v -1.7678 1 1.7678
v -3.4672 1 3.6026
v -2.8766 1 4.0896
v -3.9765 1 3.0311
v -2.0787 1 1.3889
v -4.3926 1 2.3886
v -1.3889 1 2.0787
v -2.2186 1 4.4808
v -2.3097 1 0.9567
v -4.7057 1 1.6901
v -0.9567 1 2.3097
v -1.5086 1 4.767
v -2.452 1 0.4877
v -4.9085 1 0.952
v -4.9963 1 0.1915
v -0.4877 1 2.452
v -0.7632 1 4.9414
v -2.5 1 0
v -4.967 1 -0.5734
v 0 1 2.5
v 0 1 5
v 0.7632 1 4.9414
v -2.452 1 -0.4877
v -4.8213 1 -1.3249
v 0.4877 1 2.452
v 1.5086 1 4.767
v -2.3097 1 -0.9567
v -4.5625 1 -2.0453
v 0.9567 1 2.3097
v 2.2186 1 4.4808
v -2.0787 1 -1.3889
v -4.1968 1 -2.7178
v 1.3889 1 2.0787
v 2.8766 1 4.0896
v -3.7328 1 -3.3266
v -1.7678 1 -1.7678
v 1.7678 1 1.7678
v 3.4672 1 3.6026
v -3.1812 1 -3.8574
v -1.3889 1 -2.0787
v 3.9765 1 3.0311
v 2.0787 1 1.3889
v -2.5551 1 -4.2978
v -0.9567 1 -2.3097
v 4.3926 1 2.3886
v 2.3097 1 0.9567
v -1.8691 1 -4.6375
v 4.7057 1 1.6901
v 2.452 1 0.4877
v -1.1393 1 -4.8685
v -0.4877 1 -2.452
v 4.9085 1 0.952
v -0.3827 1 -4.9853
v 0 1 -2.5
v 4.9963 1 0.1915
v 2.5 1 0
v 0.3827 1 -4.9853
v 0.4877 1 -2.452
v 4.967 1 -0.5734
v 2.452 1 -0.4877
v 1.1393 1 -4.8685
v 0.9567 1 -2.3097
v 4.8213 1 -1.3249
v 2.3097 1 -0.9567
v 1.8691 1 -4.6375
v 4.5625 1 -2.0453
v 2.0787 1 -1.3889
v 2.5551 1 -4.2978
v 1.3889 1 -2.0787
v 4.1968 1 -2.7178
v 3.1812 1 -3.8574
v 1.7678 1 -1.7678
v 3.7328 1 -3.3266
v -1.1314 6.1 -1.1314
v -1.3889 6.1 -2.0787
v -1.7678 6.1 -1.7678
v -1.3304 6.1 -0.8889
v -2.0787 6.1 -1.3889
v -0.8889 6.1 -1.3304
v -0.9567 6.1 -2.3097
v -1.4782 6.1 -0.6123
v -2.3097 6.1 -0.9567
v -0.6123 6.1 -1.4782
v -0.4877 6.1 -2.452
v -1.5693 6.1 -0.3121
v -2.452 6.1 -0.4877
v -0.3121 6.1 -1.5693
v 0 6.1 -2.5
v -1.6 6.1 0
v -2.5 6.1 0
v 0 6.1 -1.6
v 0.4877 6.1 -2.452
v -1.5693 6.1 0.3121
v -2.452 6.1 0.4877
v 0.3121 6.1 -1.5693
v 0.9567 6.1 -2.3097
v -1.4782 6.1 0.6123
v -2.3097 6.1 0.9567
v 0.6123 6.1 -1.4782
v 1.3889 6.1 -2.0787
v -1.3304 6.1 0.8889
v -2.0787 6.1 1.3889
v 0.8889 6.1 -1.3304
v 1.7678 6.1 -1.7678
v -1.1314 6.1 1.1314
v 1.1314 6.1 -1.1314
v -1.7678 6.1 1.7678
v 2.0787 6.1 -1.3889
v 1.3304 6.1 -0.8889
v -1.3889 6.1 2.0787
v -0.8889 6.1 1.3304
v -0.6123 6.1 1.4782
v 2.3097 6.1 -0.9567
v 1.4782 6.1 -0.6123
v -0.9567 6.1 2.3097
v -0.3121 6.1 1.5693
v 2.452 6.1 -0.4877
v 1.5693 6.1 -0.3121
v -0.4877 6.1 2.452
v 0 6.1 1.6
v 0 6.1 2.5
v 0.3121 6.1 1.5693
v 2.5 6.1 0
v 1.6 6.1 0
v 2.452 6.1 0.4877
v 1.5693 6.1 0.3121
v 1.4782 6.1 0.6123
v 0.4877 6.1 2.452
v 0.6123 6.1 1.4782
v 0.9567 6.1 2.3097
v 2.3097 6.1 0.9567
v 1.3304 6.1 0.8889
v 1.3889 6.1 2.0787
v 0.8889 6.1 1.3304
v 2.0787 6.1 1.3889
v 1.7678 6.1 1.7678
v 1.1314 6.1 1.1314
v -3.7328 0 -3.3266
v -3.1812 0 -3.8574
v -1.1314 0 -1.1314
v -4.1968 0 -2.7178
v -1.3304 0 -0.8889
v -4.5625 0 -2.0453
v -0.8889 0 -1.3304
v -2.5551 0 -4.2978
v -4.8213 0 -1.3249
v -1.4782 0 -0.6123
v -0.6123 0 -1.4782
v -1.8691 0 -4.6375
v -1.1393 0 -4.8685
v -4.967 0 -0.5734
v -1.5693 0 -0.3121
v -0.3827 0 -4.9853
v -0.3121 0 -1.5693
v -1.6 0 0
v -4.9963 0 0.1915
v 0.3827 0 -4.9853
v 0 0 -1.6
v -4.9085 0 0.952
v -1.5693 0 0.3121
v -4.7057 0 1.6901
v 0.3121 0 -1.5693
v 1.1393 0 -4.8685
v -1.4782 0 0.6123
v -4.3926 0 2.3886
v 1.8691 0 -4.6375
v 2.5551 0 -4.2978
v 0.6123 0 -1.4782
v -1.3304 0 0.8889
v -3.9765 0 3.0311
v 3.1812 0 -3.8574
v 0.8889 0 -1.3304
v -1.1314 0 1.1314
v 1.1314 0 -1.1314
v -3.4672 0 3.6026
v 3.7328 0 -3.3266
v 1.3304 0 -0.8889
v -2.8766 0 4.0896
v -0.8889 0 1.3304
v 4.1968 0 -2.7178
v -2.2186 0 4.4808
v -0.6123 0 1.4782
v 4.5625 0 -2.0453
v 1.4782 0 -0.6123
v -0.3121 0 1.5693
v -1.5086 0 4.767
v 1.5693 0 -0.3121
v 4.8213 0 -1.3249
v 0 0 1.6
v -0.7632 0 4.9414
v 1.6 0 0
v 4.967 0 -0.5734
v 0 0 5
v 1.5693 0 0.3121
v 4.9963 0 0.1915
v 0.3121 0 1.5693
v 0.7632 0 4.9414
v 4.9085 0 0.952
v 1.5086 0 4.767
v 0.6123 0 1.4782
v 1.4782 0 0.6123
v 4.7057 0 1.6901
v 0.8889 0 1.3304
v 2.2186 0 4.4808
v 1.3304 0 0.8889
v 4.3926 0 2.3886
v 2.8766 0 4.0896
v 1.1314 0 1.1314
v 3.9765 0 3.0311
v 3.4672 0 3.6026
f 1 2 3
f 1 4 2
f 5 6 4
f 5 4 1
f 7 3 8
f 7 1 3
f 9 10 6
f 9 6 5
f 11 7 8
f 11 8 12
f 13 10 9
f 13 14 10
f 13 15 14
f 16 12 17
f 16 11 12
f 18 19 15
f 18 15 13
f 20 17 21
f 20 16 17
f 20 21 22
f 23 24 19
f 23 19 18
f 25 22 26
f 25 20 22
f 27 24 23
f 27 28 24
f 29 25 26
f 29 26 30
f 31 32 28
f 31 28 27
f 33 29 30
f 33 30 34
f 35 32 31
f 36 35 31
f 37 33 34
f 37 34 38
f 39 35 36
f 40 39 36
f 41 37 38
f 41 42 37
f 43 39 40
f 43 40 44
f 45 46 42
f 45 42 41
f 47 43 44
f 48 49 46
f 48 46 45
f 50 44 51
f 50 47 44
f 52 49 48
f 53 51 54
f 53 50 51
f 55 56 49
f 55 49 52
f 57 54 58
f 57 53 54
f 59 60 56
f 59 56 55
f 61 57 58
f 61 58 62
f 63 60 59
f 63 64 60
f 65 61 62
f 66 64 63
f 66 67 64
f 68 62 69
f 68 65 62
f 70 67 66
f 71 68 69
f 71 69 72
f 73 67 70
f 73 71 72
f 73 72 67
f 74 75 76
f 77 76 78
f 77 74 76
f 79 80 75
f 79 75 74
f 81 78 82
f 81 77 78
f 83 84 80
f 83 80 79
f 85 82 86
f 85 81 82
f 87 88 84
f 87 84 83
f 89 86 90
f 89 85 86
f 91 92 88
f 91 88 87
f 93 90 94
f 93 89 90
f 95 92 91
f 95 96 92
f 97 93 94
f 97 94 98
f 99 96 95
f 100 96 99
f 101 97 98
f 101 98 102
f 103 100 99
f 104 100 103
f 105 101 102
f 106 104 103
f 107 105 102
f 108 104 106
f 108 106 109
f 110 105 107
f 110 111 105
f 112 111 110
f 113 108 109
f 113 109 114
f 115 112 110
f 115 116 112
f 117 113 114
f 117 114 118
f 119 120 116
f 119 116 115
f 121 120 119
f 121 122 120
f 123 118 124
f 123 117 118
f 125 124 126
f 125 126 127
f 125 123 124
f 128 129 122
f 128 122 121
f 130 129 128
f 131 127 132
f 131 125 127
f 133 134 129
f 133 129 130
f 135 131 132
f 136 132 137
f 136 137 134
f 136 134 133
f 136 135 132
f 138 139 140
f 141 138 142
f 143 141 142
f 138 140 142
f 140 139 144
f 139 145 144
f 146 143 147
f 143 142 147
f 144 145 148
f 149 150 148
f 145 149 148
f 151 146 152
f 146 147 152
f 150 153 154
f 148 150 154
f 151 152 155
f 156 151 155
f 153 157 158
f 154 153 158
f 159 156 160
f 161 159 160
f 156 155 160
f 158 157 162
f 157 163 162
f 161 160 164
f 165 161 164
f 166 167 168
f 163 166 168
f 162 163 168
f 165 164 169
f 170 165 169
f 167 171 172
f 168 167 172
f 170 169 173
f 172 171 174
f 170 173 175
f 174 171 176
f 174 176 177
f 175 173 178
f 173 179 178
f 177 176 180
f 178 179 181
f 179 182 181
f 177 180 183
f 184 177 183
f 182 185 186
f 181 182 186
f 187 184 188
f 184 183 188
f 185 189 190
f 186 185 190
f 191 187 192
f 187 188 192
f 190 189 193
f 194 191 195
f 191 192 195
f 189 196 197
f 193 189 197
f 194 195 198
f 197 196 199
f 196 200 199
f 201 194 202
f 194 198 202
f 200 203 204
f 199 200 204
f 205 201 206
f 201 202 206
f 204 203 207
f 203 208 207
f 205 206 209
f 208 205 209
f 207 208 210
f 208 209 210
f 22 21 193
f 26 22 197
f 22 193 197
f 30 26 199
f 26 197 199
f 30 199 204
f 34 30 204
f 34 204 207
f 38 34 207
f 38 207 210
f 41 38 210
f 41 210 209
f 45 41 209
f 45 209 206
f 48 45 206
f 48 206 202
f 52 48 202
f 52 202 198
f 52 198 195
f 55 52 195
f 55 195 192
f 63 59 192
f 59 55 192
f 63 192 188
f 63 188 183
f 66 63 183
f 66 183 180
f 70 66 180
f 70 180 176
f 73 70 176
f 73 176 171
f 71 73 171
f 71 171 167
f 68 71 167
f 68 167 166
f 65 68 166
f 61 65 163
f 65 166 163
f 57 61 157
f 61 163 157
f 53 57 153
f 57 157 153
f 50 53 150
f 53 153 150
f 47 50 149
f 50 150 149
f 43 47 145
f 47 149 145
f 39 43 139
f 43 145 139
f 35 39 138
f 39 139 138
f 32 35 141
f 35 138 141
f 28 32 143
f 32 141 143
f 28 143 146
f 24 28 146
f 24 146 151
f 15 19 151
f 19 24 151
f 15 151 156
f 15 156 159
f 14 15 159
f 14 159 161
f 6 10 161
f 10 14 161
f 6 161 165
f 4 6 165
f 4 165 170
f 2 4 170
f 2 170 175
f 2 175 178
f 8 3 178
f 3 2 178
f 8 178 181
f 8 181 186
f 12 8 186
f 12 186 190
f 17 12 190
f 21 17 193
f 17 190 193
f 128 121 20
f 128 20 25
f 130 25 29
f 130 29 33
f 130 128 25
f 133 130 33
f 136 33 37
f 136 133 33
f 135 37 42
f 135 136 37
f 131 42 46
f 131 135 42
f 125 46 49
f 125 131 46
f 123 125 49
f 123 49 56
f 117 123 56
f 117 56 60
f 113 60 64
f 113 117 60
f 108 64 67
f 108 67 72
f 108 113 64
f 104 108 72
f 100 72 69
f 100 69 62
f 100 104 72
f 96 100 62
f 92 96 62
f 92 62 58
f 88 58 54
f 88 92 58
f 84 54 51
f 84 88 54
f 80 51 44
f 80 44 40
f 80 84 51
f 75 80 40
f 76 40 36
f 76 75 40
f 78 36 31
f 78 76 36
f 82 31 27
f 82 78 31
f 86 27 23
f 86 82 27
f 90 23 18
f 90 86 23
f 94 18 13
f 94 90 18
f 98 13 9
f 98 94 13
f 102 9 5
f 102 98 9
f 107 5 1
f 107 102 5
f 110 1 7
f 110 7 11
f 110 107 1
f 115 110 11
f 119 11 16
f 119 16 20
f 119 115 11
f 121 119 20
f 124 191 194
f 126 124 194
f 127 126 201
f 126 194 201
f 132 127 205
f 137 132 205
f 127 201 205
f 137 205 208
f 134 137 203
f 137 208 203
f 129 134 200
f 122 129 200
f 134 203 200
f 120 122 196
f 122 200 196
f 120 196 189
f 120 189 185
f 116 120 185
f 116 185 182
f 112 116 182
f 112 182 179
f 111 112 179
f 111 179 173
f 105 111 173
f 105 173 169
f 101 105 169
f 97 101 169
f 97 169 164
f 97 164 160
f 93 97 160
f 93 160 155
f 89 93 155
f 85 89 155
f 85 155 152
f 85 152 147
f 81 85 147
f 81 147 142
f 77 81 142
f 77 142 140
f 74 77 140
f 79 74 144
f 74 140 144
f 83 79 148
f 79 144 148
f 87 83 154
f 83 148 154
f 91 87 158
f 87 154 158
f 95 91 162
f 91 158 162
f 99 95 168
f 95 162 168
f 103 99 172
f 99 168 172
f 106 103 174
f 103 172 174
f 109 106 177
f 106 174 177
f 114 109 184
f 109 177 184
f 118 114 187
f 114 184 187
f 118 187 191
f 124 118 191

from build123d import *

# Parameters (mm, degrees)
SKETCH1_R            = 5
BOSS_EXTRUDE1_DEPTH  = 6.1
M3_CLEARANCE_HOLE1_D = 3.2
SKETCH4_R            = 5.808101239
SKETCH4_R_2          = 2.5
CUT_EXTRUDE1_DEPTH   = 5.1


with BuildPart() as part:
    # Sketch1 → Boss-Extrude1 (new body)
    with BuildSketch(Plane(origin=(0, 0, 0), x_dir=(1, 0, 0), z_dir=(0, 1, 0))):
        with Locations(Location((0, 0, 0), (0, 0, 270))):
            Circle(SKETCH1_R)
    extrude(amount=BOSS_EXTRUDE1_DEPTH)

    # M3 Clearance Hole1 (through all)
    with Locations(Plane(origin=(0, 6.1, 0), x_dir=(-1, 0, 0), z_dir=(0, 1, 0))):
        with Locations((0, 0)):
            Hole(M3_CLEARANCE_HOLE1_D / 2)

    # Sketch4 → Cut-Extrude1 (cut)
    with BuildSketch(Plane(origin=(0, 6.1, 0), x_dir=(1, 0, 0), z_dir=(0, 1, 0))):
        Circle(SKETCH4_R)
        with Locations(Location((0, 0, 0), (0, 0, 270))):
            Circle(SKETCH4_R_2, mode=Mode.SUBTRACT)
    extrude(amount=-CUT_EXTRUDE1_DEPTH, mode=Mode.SUBTRACT)


solid = part.part
